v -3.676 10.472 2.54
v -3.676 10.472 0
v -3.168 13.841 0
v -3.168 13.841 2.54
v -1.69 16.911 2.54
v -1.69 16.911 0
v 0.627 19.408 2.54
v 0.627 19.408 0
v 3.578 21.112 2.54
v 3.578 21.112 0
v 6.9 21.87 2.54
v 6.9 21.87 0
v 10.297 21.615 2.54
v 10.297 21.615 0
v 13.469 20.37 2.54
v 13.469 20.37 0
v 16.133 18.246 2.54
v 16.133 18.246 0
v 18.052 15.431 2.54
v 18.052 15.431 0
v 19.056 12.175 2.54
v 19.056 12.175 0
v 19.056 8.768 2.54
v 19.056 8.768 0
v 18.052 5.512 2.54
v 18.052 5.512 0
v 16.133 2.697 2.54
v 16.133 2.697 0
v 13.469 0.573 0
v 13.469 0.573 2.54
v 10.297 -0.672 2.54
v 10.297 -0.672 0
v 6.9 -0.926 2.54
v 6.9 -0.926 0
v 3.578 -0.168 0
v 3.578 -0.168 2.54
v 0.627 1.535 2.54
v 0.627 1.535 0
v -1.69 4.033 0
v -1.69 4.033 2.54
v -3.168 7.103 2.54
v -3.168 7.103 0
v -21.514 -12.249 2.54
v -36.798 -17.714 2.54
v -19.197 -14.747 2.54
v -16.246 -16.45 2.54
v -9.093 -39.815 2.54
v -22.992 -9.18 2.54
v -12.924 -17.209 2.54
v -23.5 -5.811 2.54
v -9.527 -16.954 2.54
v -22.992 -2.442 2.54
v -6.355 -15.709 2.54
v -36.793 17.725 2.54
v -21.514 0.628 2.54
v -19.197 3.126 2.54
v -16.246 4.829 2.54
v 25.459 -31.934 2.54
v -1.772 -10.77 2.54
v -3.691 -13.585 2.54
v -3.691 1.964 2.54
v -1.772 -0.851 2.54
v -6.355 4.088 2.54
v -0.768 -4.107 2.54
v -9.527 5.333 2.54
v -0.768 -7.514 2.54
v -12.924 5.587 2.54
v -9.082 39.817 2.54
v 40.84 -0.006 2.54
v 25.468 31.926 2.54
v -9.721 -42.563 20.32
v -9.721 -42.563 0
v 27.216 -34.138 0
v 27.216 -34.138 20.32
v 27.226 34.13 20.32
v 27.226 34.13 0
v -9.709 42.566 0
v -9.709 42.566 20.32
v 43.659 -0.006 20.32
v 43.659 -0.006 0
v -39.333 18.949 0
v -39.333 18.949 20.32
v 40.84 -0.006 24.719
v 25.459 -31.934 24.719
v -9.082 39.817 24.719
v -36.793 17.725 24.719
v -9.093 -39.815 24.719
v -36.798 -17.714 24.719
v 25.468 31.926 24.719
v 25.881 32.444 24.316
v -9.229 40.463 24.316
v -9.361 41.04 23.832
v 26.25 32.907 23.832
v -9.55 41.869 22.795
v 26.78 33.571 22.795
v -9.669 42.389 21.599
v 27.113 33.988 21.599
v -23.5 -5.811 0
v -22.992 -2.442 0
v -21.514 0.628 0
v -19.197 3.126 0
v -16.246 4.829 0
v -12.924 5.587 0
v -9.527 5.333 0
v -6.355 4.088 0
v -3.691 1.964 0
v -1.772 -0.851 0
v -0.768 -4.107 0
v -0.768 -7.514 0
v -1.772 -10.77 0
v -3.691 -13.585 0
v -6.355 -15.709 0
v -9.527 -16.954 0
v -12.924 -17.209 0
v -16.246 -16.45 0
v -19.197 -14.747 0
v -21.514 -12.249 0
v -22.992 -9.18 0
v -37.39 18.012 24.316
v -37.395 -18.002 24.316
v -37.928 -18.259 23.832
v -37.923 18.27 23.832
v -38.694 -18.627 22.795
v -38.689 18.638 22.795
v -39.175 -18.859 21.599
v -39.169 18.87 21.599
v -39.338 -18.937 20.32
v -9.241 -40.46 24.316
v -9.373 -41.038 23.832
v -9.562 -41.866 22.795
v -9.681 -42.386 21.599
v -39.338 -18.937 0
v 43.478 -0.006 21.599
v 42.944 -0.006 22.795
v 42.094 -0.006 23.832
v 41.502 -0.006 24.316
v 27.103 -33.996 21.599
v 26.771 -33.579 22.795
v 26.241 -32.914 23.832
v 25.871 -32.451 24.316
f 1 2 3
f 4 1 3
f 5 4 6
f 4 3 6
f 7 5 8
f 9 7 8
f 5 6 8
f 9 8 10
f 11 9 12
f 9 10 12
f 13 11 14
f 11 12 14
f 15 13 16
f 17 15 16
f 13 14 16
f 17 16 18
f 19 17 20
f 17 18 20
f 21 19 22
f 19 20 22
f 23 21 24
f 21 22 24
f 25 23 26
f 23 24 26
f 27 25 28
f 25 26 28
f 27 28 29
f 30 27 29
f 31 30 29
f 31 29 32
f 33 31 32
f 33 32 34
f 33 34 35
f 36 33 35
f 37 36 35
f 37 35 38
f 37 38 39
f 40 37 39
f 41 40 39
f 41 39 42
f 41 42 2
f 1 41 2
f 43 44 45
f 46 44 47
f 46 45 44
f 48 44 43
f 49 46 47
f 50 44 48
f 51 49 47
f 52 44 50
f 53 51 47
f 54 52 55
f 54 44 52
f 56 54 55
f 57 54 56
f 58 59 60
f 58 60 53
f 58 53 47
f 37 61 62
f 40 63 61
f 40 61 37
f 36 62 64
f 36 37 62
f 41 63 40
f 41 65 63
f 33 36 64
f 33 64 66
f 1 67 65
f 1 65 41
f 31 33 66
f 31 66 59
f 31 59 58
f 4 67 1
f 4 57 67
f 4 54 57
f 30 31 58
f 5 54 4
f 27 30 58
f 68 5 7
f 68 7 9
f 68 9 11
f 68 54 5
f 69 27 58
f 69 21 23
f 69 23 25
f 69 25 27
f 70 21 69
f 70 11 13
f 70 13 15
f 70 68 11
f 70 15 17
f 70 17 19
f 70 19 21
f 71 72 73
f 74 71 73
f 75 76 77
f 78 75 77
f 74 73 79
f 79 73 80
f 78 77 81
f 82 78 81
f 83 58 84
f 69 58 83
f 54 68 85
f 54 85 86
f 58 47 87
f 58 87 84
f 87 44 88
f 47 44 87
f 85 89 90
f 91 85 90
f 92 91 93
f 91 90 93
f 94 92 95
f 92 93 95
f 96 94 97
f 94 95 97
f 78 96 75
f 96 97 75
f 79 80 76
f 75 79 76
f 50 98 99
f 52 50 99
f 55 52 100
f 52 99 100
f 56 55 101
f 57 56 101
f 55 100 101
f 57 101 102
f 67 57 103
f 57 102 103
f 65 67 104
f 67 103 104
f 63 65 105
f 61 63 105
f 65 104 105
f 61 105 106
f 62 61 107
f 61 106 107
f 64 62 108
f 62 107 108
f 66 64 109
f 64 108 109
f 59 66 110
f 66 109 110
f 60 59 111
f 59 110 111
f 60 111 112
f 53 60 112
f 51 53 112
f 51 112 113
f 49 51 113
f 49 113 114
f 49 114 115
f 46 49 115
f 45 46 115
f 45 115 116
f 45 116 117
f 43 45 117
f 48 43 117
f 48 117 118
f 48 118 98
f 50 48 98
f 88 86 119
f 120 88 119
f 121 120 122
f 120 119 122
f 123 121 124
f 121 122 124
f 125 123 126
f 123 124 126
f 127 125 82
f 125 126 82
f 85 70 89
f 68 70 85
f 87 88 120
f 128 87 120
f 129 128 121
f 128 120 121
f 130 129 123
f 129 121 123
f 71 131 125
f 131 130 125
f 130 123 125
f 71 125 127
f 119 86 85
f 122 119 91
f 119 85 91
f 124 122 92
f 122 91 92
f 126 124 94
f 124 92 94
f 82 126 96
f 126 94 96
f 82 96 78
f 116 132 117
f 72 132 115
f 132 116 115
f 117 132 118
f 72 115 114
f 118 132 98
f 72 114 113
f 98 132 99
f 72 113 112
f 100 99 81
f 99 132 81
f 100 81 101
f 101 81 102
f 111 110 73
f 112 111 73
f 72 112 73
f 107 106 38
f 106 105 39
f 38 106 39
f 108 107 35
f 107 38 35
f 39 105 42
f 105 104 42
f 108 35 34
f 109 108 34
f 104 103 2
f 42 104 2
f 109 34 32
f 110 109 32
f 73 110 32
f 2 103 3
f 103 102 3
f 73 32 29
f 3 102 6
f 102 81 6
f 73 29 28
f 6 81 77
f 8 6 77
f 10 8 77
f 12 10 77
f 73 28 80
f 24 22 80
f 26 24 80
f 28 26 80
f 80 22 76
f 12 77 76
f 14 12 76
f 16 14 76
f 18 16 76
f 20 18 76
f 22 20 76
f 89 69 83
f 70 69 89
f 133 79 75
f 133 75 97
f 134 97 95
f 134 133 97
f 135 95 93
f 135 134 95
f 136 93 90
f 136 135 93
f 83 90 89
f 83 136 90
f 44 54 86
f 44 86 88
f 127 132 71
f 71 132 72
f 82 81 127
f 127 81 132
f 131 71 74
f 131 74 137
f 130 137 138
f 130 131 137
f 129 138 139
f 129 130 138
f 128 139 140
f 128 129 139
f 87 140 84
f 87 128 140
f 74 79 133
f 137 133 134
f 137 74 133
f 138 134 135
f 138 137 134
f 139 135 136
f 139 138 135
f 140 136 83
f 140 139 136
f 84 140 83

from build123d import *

# Parameters (mm, degrees)
F1_DEPTH     = 25.4
F2_T         = -2.54
F4_D         = 22.86
F6_D         = 22.86
F9_T1_DEPTH  = 63.2859311747
F9_T3_DEPTH  = 63.2859311747
F9_T5_DEPTH  = 63.2859311747
F9_T7_DEPTH  = 63.2859311747
F9_T9_DEPTH  = 63.2859311747
F9_T11_DEPTH = 63.2859311747
F9_T13_DEPTH = 63.2859311747


# Not quite as in the source:
# - a fillet or chamfer that OpenCascade refuses, or shapes differently, is made with other operations: its cross-section is extruded or revolved along the edge and cut away or added
# - the program builds the solid bodies; features that only make, move or delete a surface that nothing else refers to are left out


with BuildPart() as f1:
    # F0 (on Top) → F1 (new body)
    with BuildSketch(Plane.XY):
        Polygon((27.2259101757, 34.1301219533), (-9.7089265027, 42.5658566882), (-39.3327434985, 18.9486331517), (-39.3382023982, -18.9372976297), (-9.721192539, -42.5630570455), (27.2160735783, -34.1379663779), (43.6590811844, -0.0062907401), align=None)
    extrude(amount=F1_DEPTH)

    # F2
    f2_openings = [f1.faces().sort_by_distance(p)[0] for p in [
        (0, 0, 25.4),
    ]]
    offset(amount=F2_T, openings=f2_openings)

    # F4 (through all)
    with Locations(Plane.XY.offset(2.54)):
        with Locations((-12.0702767901, -5.8105965731)):
            Hole(F4_D / 2)

    # F6 (through all)
    with Locations(Plane.XY.offset(2.54)):
        with Locations((7.7538759853, 10.4717538884)):
            Hole(F6_D / 2)

    # F9: fillet of radius 5.08 on 7 edges, made by hand

    # F9_s2 → F9_t1 (cut)
    with BuildSketch(Plane(origin=(30.848595501, -7.0456672344, 0), x_dir=(0, 0, 1), z_dir=(-0.9748958395, 0.2226614068, 0))):
        with BuildLine():
            ThreePointArc((25.4, 34.2554733567), (23.9121024484, 37.8475758051), (20.32, 39.3354733567))
            Line((20.32, 39.3354733567), (25.4, 39.3354733567))
            Line((25.4, 39.3354733567), (25.4, 34.2554733567))
        make_face()
    extrude(amount=F9_T1_DEPTH, mode=Mode.SUBTRACT)

    # F9_s4 → F9_t3 (cut)
    with BuildSketch(Plane(origin=(24.7423091554, 19.7255014847, 0), x_dir=(0, 0, 1), z_dir=(-0.7819213116, -0.623377143, 0))):
        with BuildLine():
            ThreePointArc((25.4, 34.2554733567), (23.9121024484, 37.8475758051), (20.32, 39.3354733567))
            Line((20.32, 39.3354733567), (25.4, 39.3354733567))
            Line((25.4, 39.3354733567), (25.4, 34.2554733567))
        make_face()
    extrude(amount=F9_T3_DEPTH, mode=Mode.SUBTRACT)

    # F9_s6 → F9_t5 (cut)
    with BuildSketch(Plane(origin=(0.0045593646, 31.6429652589, 0), x_dir=(0, 0, 1), z_dir=(-0.0001440878, -0.9999999896, 0))):
        with BuildLine():
            ThreePointArc((25.4, 34.2554733567), (23.9121024484, 37.8475758051), (20.32, 39.3354733567))
            Line((20.32, 39.3354733567), (25.4, 39.3354733567))
            Line((25.4, 39.3354733567), (25.4, 34.2554733567))
        make_face()
    extrude(amount=F9_T5_DEPTH, mode=Mode.SUBTRACT)

    # F9_s8 → F9_t7 (cut)
    with BuildSketch(Plane(origin=(-24.7366237207, 19.7326307943, 0), x_dir=(0, 0, 1), z_dir=(0.7817416371, -0.6236024477, 0))):
        with BuildLine():
            ThreePointArc((25.4, 34.2554733567), (23.9121024484, 37.8475758051), (20.32, 39.3354733567))
            Line((20.32, 39.3354733567), (25.4, 39.3354733567))
            Line((25.4, 39.3354733567), (25.4, 34.2554733567))
        make_face()
    extrude(amount=F9_T7_DEPTH, mode=Mode.SUBTRACT)

    # F9_s10 → F9_t9 (cut)
    with BuildSketch(Plane(origin=(-30.8506246092, -7.0367771307, 0), x_dir=(0, 0, 1), z_dir=(0.9749599646, 0.2223804564, 0))):
        with BuildLine():
            ThreePointArc((20.32, 39.3354733567), (23.9121024484, 37.8475758051), (25.4, 34.2554733567))
            Line((25.4, 34.2554733567), (25.4, 39.3354733567))
            Line((25.4, 39.3354733567), (20.32, 39.3354733567))
        make_face()
    extrude(amount=F9_T9_DEPTH, mode=Mode.SUBTRACT)

    # F9_s12 → F9_t11 (cut)
    with BuildSketch(Plane(origin=(-13.7334759289, -28.5073483522, 0), x_dir=(0, 0, 1), z_dir=(0.4340135532, 0.9009063412, 0))):
        with BuildLine():
            ThreePointArc((20.32, 39.3354733567), (23.9121024484, 37.8475758051), (25.4, 34.2554733567))
            Line((25.4, 34.2554733567), (25.4, 39.3354733567))
            Line((25.4, 39.3354733567), (20.32, 39.3354733567))
        make_face()
    extrude(amount=F9_T11_DEPTH, mode=Mode.SUBTRACT)

    # F9_s14 → F9_t13 (cut)
    with BuildSketch(Plane(origin=(13.7252602377, -28.5113048206, 0), x_dir=(0, 0, 1), z_dir=(-0.433753916, 0.9010313759, 0))):
        with BuildLine():
            ThreePointArc((20.32, 39.3354733567), (23.9121024484, 37.8475758051), (25.4, 34.2554733567))
            Line((25.4, 34.2554733567), (25.4, 39.3354733567))
            Line((25.4, 39.3354733567), (20.32, 39.3354733567))
        make_face()
    extrude(amount=F9_T13_DEPTH, mode=Mode.SUBTRACT)


solid = f1.part
